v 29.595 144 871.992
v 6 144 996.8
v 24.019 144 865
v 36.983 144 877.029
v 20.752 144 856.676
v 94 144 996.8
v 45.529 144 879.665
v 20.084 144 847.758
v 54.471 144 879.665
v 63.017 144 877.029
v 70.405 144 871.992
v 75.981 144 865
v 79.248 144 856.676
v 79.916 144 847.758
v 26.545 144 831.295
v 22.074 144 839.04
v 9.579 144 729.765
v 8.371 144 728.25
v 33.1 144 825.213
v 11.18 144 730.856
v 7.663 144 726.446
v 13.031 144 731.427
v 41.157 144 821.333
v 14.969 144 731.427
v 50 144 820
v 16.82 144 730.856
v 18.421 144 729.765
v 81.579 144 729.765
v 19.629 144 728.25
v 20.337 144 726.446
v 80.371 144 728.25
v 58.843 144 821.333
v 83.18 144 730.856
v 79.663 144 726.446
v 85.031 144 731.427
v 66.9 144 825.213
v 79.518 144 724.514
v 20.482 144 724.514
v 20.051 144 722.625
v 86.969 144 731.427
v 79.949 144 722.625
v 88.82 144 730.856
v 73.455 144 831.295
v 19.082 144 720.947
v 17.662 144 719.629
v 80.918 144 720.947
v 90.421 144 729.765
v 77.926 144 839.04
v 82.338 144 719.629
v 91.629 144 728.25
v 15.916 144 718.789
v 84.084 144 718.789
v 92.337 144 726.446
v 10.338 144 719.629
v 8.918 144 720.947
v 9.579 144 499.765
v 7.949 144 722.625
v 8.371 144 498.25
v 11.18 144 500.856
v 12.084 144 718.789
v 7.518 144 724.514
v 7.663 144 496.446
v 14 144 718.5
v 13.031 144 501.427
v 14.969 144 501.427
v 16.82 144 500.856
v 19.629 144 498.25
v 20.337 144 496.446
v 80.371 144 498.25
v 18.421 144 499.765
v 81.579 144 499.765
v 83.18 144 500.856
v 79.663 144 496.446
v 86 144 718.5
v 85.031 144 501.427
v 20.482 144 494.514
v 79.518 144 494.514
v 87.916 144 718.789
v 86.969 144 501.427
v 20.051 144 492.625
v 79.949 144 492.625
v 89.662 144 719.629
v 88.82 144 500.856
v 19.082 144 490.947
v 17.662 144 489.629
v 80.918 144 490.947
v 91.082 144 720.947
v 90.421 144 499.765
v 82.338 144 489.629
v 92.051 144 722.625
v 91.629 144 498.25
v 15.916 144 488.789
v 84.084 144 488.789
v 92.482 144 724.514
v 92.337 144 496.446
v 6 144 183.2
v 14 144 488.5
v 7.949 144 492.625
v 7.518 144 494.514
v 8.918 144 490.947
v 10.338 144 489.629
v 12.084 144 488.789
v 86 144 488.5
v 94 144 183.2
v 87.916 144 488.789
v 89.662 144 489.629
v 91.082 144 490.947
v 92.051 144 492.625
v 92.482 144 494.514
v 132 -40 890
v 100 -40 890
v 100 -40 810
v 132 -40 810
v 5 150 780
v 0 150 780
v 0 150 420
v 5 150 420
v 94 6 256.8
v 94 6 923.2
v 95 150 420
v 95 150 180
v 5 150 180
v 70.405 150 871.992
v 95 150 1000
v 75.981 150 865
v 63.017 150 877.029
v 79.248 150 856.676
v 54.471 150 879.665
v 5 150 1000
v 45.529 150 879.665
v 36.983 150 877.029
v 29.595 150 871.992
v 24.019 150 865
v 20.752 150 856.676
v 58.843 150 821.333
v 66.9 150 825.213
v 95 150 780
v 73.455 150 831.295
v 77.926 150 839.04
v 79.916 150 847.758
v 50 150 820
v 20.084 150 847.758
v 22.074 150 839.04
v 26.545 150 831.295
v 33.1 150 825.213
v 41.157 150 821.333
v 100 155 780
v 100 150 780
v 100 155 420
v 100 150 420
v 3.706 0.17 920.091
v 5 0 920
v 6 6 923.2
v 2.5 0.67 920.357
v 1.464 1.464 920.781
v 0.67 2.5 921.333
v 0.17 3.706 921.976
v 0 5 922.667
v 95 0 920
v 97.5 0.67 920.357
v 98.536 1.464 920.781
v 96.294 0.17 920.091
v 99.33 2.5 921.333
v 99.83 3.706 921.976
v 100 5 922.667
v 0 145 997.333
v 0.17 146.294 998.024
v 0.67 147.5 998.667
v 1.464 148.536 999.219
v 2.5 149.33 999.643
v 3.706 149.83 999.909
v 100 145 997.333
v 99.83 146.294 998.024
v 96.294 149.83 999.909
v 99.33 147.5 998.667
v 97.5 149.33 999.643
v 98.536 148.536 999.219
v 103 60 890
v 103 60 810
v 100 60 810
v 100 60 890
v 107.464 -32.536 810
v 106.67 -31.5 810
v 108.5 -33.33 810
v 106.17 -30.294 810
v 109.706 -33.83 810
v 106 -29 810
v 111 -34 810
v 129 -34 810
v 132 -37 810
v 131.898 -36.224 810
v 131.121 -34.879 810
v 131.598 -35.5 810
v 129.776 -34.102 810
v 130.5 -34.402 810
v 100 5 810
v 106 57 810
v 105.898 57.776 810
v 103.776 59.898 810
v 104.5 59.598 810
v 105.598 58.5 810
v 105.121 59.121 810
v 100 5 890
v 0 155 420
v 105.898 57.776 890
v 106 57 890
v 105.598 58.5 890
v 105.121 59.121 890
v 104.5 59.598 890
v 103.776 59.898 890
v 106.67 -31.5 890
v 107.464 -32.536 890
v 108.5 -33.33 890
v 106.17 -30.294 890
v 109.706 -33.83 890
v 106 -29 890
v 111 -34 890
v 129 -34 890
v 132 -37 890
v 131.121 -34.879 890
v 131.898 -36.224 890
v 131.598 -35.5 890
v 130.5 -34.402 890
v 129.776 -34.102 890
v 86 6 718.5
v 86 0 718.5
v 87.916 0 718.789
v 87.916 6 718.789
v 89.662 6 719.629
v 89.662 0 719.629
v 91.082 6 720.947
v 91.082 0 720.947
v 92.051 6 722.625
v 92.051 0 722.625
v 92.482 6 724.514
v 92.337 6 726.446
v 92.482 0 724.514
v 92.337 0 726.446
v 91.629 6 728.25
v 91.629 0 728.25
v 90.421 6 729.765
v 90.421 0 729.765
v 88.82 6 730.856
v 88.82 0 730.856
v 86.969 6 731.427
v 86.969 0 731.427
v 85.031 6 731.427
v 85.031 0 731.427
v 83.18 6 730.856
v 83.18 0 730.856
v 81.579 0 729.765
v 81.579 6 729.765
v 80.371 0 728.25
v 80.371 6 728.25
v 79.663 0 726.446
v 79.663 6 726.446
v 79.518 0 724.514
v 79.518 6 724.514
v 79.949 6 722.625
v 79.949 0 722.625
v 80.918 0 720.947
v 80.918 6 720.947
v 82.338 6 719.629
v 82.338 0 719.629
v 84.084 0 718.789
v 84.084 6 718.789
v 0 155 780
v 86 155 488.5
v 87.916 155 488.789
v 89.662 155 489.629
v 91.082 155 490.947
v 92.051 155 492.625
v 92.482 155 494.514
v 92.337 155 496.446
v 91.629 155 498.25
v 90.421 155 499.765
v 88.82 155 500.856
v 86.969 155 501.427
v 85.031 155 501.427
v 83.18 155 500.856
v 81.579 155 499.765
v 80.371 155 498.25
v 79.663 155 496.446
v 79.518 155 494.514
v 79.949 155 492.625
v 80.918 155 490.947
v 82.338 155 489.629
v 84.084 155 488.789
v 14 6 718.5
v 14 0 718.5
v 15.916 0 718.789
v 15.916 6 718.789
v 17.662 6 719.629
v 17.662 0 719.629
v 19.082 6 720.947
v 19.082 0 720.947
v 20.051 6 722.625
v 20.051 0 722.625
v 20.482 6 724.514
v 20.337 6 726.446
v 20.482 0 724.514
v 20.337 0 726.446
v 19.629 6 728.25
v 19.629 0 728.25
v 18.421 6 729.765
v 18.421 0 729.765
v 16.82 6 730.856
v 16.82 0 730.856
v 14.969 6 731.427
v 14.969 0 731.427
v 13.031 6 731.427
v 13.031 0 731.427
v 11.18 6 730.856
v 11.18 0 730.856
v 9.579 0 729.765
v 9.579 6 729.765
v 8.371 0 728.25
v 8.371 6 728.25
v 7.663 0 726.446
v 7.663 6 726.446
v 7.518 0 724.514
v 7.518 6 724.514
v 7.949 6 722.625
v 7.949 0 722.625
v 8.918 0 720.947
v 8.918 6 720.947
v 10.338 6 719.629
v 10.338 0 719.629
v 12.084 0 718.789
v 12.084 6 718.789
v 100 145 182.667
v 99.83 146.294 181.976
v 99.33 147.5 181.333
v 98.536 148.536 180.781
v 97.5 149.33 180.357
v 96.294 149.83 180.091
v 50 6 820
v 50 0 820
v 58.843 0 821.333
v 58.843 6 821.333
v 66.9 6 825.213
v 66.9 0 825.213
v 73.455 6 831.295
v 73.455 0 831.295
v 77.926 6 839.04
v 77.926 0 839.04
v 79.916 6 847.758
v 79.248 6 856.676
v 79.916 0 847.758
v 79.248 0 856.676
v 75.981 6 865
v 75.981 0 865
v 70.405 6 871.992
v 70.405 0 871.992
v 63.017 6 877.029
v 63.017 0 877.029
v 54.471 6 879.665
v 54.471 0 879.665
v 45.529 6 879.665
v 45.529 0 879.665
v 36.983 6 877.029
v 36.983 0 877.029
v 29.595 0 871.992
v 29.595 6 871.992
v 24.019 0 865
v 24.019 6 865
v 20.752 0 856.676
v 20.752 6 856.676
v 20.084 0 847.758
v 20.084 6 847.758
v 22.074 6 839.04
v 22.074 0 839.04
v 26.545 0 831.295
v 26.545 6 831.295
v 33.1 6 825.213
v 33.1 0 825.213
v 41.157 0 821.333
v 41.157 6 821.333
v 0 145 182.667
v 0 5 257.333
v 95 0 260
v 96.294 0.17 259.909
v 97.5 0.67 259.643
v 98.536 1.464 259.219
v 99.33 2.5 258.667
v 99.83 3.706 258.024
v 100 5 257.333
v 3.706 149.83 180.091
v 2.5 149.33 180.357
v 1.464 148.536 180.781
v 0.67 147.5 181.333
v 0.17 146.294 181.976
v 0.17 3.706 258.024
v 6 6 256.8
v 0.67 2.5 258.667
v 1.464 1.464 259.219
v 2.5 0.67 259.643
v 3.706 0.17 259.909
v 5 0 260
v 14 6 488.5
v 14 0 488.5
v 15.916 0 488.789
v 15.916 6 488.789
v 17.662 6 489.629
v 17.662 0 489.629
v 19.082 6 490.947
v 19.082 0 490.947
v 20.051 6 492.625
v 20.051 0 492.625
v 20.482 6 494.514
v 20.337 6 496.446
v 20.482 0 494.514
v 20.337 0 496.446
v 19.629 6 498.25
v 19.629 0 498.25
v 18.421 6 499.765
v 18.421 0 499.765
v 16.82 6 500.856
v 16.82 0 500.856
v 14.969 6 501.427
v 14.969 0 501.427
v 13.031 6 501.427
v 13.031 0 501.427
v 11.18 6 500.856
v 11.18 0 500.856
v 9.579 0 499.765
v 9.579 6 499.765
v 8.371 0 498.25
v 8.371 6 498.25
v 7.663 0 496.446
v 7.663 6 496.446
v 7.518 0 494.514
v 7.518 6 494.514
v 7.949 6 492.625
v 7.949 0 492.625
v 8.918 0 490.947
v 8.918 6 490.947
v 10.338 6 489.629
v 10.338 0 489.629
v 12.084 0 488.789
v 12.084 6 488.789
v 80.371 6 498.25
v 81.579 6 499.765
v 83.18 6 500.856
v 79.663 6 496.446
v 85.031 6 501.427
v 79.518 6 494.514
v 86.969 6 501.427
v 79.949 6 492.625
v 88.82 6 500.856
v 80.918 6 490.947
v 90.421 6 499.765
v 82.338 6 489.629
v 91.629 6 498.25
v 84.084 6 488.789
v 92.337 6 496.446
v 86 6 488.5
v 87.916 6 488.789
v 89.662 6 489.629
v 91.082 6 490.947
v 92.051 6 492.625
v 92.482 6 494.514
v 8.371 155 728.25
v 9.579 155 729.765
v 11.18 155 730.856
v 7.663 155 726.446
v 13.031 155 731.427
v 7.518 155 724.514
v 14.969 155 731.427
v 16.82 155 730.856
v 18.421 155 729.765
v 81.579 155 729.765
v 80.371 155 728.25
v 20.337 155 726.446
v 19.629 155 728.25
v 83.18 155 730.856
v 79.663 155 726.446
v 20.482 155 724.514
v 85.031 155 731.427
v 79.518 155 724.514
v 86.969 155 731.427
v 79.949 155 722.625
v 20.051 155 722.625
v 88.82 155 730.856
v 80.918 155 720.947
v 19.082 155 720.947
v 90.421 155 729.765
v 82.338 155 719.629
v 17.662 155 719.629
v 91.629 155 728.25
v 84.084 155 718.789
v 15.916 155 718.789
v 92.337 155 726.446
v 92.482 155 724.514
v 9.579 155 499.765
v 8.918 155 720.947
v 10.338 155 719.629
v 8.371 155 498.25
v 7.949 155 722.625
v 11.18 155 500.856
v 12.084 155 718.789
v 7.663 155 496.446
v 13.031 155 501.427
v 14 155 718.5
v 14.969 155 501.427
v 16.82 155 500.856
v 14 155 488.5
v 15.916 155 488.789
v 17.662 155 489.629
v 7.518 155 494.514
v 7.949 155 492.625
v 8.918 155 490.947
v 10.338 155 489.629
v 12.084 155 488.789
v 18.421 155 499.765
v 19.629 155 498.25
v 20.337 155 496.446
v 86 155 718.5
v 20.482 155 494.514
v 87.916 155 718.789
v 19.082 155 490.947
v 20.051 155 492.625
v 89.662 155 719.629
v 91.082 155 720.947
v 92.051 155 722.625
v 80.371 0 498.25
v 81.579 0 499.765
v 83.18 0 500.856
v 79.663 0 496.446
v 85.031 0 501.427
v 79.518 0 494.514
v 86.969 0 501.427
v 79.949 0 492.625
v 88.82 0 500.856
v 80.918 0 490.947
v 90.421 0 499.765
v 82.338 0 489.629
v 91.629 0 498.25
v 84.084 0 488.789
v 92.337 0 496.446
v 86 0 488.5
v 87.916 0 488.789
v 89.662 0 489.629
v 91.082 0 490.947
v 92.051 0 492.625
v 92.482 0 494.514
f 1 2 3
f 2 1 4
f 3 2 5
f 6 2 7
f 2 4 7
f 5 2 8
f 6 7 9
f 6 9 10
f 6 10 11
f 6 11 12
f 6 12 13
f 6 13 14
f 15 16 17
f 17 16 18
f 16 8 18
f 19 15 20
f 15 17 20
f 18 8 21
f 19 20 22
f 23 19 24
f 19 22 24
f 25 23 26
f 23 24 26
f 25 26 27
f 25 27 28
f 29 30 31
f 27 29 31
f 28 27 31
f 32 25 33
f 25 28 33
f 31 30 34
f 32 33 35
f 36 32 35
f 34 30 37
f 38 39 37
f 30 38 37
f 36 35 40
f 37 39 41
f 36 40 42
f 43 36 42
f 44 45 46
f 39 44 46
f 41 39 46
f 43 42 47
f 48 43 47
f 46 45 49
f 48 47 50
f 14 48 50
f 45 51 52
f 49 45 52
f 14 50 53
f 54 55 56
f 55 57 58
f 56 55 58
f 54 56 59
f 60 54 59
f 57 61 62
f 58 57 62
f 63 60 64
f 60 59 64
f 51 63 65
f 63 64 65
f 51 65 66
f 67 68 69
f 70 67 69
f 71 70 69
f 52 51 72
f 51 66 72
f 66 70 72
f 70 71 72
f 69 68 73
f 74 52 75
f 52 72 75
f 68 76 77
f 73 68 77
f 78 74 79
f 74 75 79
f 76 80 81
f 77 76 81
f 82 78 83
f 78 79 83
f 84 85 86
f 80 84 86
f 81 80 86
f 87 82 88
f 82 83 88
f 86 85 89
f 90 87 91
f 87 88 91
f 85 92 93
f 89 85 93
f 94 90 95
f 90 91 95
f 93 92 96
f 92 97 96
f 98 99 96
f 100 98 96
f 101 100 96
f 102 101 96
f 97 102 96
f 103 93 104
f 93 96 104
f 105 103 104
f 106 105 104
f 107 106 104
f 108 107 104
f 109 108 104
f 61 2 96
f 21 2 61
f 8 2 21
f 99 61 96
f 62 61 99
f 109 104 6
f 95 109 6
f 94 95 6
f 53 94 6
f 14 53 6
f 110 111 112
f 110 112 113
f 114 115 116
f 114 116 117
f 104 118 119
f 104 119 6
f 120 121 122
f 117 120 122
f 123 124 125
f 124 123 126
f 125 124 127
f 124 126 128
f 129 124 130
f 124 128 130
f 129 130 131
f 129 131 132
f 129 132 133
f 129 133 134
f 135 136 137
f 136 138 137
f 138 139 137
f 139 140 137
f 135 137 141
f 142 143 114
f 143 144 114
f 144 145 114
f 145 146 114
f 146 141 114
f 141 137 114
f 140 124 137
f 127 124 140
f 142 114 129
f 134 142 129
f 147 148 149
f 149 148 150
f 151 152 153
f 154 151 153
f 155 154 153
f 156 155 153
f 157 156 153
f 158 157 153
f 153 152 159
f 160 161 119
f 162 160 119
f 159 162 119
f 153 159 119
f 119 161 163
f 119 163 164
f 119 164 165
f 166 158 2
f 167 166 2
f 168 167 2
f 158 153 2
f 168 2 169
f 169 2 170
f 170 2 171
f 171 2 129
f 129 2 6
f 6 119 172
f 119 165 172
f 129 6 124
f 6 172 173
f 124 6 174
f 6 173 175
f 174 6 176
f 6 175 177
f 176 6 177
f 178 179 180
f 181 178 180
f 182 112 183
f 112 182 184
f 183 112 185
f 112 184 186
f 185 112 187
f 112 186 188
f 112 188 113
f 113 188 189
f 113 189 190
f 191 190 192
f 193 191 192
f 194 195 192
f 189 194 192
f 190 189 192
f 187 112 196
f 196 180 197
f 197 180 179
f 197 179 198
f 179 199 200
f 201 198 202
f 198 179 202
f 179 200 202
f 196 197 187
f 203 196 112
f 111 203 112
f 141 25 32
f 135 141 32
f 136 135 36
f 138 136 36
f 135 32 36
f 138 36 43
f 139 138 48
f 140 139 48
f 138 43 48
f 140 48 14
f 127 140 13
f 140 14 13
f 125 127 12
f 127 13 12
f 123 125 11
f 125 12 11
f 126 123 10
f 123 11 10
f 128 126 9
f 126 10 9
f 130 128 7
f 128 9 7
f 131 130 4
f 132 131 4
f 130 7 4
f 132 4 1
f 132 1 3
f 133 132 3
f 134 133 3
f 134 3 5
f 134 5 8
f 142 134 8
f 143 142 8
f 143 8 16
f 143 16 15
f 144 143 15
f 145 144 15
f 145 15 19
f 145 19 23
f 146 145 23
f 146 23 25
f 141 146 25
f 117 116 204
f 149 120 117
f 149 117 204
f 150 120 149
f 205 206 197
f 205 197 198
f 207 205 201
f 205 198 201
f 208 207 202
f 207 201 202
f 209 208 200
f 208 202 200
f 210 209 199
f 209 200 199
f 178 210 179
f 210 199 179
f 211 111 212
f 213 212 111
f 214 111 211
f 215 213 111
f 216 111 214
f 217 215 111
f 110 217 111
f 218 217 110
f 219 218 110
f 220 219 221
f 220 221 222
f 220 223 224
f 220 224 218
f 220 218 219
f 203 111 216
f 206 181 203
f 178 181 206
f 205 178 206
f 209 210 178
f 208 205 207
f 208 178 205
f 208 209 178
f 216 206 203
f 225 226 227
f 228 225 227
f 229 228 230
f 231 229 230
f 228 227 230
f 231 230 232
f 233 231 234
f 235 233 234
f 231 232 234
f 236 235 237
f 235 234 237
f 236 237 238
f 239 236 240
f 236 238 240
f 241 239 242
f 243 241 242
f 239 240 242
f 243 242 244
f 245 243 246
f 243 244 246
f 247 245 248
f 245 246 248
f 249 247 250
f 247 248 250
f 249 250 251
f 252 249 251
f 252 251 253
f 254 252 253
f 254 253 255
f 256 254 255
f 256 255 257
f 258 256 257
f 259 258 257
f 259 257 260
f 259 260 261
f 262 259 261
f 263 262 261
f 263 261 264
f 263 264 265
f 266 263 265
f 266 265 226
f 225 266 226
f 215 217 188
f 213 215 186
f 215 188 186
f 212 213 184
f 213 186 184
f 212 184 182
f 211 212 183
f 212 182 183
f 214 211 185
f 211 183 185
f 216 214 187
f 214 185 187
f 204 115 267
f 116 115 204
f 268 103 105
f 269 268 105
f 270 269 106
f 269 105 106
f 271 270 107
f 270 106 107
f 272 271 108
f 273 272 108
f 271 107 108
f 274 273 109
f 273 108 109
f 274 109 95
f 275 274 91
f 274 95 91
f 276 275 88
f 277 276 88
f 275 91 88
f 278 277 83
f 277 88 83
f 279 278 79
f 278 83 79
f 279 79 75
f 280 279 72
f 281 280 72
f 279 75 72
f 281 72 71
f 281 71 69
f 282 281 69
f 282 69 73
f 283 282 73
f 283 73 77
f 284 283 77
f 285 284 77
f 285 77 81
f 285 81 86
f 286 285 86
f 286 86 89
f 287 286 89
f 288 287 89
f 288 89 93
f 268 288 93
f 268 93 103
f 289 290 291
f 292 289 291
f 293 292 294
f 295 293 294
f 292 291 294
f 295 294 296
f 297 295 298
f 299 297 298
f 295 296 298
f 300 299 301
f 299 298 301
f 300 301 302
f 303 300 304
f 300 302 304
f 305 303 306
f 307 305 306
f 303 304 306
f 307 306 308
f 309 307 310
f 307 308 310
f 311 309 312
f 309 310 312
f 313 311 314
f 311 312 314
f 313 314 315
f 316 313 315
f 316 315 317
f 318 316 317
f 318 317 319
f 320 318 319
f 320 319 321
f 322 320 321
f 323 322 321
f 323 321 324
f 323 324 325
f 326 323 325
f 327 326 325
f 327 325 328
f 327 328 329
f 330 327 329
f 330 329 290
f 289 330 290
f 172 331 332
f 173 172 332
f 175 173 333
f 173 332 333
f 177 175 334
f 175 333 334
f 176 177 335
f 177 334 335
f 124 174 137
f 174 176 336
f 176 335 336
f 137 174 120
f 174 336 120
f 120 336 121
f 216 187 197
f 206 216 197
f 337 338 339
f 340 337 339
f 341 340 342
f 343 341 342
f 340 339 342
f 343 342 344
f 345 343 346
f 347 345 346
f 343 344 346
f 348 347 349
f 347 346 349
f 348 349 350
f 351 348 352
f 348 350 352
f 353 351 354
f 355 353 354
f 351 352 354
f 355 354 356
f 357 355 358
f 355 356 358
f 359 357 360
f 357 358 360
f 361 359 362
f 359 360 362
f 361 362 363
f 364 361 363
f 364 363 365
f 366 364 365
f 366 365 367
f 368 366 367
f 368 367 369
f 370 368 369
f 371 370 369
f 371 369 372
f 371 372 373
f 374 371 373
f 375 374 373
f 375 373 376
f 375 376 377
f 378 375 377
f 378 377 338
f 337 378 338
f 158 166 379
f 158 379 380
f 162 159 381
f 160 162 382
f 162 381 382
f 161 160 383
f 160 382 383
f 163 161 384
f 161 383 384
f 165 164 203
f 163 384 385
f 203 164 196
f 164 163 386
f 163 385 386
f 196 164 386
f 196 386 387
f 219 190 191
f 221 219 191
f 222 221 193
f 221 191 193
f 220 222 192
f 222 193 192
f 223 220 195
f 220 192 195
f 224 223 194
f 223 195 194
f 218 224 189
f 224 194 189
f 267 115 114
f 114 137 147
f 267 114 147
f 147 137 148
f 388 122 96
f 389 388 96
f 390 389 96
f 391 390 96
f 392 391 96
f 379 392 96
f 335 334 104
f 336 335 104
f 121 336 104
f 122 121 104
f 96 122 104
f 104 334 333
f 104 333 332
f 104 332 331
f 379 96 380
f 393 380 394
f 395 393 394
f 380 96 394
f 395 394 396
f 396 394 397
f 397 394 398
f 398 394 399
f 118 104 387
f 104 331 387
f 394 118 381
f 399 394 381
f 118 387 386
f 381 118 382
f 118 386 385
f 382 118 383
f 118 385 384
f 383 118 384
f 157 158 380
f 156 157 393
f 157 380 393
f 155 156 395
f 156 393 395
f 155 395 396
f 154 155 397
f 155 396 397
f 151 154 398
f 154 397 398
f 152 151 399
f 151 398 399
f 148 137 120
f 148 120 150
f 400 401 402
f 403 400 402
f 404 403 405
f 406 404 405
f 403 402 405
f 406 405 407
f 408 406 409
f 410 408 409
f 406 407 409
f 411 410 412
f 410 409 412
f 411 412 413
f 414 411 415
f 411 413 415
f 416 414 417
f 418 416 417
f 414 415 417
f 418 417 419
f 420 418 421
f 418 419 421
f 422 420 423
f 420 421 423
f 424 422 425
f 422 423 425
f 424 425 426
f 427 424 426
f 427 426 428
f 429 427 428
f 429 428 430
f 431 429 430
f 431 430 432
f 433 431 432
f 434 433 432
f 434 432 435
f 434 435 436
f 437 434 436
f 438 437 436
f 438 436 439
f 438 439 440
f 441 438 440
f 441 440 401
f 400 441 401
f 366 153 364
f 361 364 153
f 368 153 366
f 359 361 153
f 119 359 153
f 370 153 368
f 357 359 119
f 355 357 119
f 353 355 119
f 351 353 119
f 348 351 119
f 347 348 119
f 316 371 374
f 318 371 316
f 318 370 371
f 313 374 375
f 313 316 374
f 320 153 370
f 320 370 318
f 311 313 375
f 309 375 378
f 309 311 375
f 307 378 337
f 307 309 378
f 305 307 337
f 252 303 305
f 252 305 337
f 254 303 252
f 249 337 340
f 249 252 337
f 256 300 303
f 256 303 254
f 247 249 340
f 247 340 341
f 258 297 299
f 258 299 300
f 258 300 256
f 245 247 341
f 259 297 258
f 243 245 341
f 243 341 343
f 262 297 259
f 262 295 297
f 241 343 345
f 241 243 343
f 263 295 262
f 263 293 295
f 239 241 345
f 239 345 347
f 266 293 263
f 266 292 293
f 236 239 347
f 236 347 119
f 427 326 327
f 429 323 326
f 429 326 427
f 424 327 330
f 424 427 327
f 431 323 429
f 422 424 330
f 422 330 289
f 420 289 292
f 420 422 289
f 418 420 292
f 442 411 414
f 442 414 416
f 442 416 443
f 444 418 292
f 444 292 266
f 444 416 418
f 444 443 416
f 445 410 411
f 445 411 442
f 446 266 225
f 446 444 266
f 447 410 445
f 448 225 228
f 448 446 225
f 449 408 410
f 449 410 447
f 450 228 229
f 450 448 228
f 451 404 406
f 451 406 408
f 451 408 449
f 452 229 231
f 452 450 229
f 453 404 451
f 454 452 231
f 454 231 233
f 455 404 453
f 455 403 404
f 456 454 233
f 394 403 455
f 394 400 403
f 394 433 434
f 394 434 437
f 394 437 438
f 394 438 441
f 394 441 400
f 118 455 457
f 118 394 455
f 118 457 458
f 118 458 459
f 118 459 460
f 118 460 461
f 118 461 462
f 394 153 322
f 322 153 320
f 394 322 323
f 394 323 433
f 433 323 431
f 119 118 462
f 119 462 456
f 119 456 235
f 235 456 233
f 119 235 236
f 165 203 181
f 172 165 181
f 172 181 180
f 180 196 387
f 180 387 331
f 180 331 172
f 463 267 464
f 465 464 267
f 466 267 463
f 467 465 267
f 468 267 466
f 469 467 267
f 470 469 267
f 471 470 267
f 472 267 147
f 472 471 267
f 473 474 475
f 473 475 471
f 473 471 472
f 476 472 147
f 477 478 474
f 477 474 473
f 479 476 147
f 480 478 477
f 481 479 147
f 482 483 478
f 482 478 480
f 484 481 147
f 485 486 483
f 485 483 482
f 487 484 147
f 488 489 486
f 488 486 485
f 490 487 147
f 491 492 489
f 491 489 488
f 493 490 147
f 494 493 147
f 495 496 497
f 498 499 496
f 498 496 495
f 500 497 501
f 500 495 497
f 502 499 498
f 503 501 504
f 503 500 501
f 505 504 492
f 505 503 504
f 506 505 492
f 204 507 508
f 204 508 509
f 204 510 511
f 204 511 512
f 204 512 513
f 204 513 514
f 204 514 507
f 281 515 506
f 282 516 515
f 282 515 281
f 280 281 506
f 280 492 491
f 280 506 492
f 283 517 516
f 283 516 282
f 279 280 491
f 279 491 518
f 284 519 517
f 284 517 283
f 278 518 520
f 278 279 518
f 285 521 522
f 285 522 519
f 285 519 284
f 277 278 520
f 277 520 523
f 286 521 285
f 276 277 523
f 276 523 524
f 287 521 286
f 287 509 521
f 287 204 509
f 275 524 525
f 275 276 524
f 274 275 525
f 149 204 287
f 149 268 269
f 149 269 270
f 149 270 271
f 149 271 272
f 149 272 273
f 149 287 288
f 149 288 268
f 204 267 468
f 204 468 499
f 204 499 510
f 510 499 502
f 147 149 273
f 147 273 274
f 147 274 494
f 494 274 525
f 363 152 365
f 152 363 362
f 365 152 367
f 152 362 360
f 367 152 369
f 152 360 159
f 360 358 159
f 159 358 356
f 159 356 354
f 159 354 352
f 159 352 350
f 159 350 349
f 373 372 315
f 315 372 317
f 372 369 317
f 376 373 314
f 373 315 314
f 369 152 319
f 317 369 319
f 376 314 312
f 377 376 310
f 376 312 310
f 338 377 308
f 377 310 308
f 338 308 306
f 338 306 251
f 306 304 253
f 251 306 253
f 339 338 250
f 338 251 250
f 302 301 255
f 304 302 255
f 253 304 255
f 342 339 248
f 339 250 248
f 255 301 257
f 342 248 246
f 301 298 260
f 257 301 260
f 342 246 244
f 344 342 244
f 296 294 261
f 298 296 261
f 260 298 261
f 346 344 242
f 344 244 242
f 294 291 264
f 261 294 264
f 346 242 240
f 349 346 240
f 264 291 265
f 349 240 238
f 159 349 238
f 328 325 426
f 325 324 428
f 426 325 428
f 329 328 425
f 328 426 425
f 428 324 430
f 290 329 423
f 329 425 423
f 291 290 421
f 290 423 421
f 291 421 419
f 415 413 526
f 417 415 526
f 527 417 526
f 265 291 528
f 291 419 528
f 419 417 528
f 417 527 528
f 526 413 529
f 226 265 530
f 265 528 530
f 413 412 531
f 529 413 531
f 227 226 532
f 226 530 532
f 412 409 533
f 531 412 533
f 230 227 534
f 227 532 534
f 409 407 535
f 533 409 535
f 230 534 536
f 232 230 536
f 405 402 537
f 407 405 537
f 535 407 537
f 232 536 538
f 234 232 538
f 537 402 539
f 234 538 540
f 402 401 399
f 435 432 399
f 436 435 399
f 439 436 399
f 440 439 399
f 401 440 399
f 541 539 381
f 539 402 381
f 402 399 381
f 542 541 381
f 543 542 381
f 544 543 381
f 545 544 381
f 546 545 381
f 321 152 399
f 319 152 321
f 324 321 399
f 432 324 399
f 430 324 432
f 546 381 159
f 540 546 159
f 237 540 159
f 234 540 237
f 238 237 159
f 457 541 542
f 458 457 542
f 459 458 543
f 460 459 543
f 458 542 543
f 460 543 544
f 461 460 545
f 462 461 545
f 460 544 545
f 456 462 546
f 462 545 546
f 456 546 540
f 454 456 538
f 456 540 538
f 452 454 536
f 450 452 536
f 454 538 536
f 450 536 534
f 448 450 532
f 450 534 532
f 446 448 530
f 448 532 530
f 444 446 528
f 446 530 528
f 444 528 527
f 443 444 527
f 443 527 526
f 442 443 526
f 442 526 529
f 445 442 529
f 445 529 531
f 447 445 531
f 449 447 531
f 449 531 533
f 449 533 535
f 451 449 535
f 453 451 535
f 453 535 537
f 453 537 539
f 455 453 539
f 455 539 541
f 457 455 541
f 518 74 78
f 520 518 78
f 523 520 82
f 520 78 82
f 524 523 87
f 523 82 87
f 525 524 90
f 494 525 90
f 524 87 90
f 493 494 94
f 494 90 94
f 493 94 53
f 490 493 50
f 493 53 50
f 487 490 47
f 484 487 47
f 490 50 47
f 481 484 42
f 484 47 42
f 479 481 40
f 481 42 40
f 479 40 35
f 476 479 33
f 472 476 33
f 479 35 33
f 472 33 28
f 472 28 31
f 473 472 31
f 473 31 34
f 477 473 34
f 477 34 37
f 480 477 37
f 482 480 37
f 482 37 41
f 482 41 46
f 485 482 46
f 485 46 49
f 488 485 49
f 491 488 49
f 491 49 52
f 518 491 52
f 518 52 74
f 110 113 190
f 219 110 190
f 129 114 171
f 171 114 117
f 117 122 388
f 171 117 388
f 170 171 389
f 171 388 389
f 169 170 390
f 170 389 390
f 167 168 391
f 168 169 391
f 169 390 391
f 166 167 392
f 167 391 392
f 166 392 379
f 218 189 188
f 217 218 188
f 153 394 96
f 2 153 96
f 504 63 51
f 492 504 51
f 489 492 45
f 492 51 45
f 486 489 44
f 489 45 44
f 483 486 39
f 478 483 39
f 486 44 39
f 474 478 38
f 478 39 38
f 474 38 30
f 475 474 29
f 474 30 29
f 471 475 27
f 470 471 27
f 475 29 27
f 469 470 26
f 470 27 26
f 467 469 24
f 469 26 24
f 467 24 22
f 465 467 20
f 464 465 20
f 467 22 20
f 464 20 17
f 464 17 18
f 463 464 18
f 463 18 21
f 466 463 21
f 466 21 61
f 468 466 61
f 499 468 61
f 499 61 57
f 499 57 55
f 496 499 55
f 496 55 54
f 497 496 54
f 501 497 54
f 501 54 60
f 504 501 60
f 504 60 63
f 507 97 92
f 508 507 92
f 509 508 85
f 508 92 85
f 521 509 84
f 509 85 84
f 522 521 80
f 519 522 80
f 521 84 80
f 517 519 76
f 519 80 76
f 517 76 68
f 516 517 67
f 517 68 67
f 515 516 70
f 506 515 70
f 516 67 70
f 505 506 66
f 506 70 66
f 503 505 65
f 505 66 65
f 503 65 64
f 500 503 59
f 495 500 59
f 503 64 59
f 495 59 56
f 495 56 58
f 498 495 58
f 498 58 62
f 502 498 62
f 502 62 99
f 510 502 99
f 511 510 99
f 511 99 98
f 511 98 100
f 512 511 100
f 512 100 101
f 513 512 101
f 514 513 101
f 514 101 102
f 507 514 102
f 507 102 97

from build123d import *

# Parameters (mm, degrees)
SCHIZZO1_W                = 88
SCHIZZO1_H                = 138
ESTRUSIONE_SOTTILE1_DEPTH = 1000
ESTRUSIONE1_DEPTH         = 1017.120071645
ESTRUSIONE2_DEPTH         = 1017.120071645
SCHIZZO4_R                = 30
ESTRUSIONE3_DEPTH         = 1017.120071645
SCHIZZO7_W                = 100
SCHIZZO7_H                = 360
ESTRUSIONE6_DEPTH         = 5
SCHIZZO6_R                = 6.5
ESTRUSIONE5_DEPTH         = 1017.870198206
ESTRUSIONE7_DEPTH         = 40
ESTRUSIONE7_DEPTH_BACK    = 40


with BuildPart() as part:
    # Schizzo1 → Estrusione-Sottile1 (new body)
    with BuildSketch(Plane.XY):
        with BuildLine():
            Line((5, 0), (95, 0))
            ThreePointArc((95, 0), (98.535533906, 1.464466094), (100, 5))
            Line((100, 5), (100, 145))
            ThreePointArc((100, 145), (98.535533906, 148.535533906), (95, 150))
            Line((95, 150), (5, 150))
            ThreePointArc((5, 150), (1.464466094, 148.535533906), (0, 145))
            Line((0, 145), (0, 5))
            ThreePointArc((0, 5), (1.464466094, 1.464466094), (5, 0))
        make_face()
        with Locations((50, 75)):
            Rectangle(SCHIZZO1_W, SCHIZZO1_H, mode=Mode.SUBTRACT)
    extrude(amount=ESTRUSIONE_SOTTILE1_DEPTH)

    # Schizzo2 → Estrusione1 (cut, through all)
    with BuildSketch(Plane(origin=(100, 0, 0), x_dir=(0, 0, -1), z_dir=(1, 0, 0))):
        Polygon((-920, 0), (-1000, 150), (-1000, 0), align=None)
    extrude(amount=-ESTRUSIONE1_DEPTH, mode=Mode.SUBTRACT)

    # Schizzo3 → Estrusione2 (cut, through all)
    with BuildSketch(Plane(origin=(100, 0, 0), x_dir=(0, 0, -1), z_dir=(1, 0, 0))):
        Polygon((-180, 150), (-260, 0), (0, 0), (0, 150), align=None)
    extrude(amount=-ESTRUSIONE2_DEPTH, mode=Mode.SUBTRACT)

    # Schizzo4 → Estrusione3 (cut, through all)
    with BuildSketch(Plane.XZ):
        with Locations(Location((50, 850, 0), (0, 0, 270))):
            Circle(SCHIZZO4_R)
    extrude(amount=-ESTRUSIONE3_DEPTH, mode=Mode.SUBTRACT)

    # Schizzo7 → Estrusione6 (add)
    with BuildSketch(Plane(origin=(0, 150, 0), x_dir=(1, 0, 0), z_dir=(0, 1, 0))):
        with Locations((50, -600)):
            Rectangle(SCHIZZO7_W, SCHIZZO7_H)
    extrude(amount=ESTRUSIONE6_DEPTH)

    # Schizzo6 → Estrusione5 (cut, through all)
    with BuildSketch(Plane.XZ):
        with Locations(Location((14, 725, 0), (0, 0, 270))):
            Circle(SCHIZZO6_R)
        with Locations(Location((14, 495, 0), (0, 0, 270))):
            Circle(SCHIZZO6_R)
        with Locations(Location((86, 495, 0), (0, 0, 270))):
            Circle(SCHIZZO6_R)
        with Locations(Location((86, 725, 0), (0, 0, 270))):
            Circle(SCHIZZO6_R)
    extrude(amount=-ESTRUSIONE5_DEPTH, mode=Mode.SUBTRACT)

    # Schizzo9 → Estrusione7 (add, two sides: drawn at the far end of the back side and taken through both)
    with BuildSketch(Plane.XY.offset(850).offset(-ESTRUSIONE7_DEPTH_BACK)):
        with BuildLine():
            Line((100, 60), (100, -40))
            Line((100, -40), (132, -40))
            Line((132, -40), (132, -37))
            ThreePointArc((132, -37), (131.121320344, -34.878679656), (129, -34))
            Line((129, -34), (111, -34))
            ThreePointArc((111, -34), (107.464466094, -32.535533906), (106, -29))
            Line((106, -29), (106, 57))
            ThreePointArc((106, 57), (105.121320344, 59.121320344), (103, 60))
            Line((103, 60), (100, 60))
        make_face()
    extrude(amount=ESTRUSIONE7_DEPTH + ESTRUSIONE7_DEPTH_BACK)


solid = part.part
